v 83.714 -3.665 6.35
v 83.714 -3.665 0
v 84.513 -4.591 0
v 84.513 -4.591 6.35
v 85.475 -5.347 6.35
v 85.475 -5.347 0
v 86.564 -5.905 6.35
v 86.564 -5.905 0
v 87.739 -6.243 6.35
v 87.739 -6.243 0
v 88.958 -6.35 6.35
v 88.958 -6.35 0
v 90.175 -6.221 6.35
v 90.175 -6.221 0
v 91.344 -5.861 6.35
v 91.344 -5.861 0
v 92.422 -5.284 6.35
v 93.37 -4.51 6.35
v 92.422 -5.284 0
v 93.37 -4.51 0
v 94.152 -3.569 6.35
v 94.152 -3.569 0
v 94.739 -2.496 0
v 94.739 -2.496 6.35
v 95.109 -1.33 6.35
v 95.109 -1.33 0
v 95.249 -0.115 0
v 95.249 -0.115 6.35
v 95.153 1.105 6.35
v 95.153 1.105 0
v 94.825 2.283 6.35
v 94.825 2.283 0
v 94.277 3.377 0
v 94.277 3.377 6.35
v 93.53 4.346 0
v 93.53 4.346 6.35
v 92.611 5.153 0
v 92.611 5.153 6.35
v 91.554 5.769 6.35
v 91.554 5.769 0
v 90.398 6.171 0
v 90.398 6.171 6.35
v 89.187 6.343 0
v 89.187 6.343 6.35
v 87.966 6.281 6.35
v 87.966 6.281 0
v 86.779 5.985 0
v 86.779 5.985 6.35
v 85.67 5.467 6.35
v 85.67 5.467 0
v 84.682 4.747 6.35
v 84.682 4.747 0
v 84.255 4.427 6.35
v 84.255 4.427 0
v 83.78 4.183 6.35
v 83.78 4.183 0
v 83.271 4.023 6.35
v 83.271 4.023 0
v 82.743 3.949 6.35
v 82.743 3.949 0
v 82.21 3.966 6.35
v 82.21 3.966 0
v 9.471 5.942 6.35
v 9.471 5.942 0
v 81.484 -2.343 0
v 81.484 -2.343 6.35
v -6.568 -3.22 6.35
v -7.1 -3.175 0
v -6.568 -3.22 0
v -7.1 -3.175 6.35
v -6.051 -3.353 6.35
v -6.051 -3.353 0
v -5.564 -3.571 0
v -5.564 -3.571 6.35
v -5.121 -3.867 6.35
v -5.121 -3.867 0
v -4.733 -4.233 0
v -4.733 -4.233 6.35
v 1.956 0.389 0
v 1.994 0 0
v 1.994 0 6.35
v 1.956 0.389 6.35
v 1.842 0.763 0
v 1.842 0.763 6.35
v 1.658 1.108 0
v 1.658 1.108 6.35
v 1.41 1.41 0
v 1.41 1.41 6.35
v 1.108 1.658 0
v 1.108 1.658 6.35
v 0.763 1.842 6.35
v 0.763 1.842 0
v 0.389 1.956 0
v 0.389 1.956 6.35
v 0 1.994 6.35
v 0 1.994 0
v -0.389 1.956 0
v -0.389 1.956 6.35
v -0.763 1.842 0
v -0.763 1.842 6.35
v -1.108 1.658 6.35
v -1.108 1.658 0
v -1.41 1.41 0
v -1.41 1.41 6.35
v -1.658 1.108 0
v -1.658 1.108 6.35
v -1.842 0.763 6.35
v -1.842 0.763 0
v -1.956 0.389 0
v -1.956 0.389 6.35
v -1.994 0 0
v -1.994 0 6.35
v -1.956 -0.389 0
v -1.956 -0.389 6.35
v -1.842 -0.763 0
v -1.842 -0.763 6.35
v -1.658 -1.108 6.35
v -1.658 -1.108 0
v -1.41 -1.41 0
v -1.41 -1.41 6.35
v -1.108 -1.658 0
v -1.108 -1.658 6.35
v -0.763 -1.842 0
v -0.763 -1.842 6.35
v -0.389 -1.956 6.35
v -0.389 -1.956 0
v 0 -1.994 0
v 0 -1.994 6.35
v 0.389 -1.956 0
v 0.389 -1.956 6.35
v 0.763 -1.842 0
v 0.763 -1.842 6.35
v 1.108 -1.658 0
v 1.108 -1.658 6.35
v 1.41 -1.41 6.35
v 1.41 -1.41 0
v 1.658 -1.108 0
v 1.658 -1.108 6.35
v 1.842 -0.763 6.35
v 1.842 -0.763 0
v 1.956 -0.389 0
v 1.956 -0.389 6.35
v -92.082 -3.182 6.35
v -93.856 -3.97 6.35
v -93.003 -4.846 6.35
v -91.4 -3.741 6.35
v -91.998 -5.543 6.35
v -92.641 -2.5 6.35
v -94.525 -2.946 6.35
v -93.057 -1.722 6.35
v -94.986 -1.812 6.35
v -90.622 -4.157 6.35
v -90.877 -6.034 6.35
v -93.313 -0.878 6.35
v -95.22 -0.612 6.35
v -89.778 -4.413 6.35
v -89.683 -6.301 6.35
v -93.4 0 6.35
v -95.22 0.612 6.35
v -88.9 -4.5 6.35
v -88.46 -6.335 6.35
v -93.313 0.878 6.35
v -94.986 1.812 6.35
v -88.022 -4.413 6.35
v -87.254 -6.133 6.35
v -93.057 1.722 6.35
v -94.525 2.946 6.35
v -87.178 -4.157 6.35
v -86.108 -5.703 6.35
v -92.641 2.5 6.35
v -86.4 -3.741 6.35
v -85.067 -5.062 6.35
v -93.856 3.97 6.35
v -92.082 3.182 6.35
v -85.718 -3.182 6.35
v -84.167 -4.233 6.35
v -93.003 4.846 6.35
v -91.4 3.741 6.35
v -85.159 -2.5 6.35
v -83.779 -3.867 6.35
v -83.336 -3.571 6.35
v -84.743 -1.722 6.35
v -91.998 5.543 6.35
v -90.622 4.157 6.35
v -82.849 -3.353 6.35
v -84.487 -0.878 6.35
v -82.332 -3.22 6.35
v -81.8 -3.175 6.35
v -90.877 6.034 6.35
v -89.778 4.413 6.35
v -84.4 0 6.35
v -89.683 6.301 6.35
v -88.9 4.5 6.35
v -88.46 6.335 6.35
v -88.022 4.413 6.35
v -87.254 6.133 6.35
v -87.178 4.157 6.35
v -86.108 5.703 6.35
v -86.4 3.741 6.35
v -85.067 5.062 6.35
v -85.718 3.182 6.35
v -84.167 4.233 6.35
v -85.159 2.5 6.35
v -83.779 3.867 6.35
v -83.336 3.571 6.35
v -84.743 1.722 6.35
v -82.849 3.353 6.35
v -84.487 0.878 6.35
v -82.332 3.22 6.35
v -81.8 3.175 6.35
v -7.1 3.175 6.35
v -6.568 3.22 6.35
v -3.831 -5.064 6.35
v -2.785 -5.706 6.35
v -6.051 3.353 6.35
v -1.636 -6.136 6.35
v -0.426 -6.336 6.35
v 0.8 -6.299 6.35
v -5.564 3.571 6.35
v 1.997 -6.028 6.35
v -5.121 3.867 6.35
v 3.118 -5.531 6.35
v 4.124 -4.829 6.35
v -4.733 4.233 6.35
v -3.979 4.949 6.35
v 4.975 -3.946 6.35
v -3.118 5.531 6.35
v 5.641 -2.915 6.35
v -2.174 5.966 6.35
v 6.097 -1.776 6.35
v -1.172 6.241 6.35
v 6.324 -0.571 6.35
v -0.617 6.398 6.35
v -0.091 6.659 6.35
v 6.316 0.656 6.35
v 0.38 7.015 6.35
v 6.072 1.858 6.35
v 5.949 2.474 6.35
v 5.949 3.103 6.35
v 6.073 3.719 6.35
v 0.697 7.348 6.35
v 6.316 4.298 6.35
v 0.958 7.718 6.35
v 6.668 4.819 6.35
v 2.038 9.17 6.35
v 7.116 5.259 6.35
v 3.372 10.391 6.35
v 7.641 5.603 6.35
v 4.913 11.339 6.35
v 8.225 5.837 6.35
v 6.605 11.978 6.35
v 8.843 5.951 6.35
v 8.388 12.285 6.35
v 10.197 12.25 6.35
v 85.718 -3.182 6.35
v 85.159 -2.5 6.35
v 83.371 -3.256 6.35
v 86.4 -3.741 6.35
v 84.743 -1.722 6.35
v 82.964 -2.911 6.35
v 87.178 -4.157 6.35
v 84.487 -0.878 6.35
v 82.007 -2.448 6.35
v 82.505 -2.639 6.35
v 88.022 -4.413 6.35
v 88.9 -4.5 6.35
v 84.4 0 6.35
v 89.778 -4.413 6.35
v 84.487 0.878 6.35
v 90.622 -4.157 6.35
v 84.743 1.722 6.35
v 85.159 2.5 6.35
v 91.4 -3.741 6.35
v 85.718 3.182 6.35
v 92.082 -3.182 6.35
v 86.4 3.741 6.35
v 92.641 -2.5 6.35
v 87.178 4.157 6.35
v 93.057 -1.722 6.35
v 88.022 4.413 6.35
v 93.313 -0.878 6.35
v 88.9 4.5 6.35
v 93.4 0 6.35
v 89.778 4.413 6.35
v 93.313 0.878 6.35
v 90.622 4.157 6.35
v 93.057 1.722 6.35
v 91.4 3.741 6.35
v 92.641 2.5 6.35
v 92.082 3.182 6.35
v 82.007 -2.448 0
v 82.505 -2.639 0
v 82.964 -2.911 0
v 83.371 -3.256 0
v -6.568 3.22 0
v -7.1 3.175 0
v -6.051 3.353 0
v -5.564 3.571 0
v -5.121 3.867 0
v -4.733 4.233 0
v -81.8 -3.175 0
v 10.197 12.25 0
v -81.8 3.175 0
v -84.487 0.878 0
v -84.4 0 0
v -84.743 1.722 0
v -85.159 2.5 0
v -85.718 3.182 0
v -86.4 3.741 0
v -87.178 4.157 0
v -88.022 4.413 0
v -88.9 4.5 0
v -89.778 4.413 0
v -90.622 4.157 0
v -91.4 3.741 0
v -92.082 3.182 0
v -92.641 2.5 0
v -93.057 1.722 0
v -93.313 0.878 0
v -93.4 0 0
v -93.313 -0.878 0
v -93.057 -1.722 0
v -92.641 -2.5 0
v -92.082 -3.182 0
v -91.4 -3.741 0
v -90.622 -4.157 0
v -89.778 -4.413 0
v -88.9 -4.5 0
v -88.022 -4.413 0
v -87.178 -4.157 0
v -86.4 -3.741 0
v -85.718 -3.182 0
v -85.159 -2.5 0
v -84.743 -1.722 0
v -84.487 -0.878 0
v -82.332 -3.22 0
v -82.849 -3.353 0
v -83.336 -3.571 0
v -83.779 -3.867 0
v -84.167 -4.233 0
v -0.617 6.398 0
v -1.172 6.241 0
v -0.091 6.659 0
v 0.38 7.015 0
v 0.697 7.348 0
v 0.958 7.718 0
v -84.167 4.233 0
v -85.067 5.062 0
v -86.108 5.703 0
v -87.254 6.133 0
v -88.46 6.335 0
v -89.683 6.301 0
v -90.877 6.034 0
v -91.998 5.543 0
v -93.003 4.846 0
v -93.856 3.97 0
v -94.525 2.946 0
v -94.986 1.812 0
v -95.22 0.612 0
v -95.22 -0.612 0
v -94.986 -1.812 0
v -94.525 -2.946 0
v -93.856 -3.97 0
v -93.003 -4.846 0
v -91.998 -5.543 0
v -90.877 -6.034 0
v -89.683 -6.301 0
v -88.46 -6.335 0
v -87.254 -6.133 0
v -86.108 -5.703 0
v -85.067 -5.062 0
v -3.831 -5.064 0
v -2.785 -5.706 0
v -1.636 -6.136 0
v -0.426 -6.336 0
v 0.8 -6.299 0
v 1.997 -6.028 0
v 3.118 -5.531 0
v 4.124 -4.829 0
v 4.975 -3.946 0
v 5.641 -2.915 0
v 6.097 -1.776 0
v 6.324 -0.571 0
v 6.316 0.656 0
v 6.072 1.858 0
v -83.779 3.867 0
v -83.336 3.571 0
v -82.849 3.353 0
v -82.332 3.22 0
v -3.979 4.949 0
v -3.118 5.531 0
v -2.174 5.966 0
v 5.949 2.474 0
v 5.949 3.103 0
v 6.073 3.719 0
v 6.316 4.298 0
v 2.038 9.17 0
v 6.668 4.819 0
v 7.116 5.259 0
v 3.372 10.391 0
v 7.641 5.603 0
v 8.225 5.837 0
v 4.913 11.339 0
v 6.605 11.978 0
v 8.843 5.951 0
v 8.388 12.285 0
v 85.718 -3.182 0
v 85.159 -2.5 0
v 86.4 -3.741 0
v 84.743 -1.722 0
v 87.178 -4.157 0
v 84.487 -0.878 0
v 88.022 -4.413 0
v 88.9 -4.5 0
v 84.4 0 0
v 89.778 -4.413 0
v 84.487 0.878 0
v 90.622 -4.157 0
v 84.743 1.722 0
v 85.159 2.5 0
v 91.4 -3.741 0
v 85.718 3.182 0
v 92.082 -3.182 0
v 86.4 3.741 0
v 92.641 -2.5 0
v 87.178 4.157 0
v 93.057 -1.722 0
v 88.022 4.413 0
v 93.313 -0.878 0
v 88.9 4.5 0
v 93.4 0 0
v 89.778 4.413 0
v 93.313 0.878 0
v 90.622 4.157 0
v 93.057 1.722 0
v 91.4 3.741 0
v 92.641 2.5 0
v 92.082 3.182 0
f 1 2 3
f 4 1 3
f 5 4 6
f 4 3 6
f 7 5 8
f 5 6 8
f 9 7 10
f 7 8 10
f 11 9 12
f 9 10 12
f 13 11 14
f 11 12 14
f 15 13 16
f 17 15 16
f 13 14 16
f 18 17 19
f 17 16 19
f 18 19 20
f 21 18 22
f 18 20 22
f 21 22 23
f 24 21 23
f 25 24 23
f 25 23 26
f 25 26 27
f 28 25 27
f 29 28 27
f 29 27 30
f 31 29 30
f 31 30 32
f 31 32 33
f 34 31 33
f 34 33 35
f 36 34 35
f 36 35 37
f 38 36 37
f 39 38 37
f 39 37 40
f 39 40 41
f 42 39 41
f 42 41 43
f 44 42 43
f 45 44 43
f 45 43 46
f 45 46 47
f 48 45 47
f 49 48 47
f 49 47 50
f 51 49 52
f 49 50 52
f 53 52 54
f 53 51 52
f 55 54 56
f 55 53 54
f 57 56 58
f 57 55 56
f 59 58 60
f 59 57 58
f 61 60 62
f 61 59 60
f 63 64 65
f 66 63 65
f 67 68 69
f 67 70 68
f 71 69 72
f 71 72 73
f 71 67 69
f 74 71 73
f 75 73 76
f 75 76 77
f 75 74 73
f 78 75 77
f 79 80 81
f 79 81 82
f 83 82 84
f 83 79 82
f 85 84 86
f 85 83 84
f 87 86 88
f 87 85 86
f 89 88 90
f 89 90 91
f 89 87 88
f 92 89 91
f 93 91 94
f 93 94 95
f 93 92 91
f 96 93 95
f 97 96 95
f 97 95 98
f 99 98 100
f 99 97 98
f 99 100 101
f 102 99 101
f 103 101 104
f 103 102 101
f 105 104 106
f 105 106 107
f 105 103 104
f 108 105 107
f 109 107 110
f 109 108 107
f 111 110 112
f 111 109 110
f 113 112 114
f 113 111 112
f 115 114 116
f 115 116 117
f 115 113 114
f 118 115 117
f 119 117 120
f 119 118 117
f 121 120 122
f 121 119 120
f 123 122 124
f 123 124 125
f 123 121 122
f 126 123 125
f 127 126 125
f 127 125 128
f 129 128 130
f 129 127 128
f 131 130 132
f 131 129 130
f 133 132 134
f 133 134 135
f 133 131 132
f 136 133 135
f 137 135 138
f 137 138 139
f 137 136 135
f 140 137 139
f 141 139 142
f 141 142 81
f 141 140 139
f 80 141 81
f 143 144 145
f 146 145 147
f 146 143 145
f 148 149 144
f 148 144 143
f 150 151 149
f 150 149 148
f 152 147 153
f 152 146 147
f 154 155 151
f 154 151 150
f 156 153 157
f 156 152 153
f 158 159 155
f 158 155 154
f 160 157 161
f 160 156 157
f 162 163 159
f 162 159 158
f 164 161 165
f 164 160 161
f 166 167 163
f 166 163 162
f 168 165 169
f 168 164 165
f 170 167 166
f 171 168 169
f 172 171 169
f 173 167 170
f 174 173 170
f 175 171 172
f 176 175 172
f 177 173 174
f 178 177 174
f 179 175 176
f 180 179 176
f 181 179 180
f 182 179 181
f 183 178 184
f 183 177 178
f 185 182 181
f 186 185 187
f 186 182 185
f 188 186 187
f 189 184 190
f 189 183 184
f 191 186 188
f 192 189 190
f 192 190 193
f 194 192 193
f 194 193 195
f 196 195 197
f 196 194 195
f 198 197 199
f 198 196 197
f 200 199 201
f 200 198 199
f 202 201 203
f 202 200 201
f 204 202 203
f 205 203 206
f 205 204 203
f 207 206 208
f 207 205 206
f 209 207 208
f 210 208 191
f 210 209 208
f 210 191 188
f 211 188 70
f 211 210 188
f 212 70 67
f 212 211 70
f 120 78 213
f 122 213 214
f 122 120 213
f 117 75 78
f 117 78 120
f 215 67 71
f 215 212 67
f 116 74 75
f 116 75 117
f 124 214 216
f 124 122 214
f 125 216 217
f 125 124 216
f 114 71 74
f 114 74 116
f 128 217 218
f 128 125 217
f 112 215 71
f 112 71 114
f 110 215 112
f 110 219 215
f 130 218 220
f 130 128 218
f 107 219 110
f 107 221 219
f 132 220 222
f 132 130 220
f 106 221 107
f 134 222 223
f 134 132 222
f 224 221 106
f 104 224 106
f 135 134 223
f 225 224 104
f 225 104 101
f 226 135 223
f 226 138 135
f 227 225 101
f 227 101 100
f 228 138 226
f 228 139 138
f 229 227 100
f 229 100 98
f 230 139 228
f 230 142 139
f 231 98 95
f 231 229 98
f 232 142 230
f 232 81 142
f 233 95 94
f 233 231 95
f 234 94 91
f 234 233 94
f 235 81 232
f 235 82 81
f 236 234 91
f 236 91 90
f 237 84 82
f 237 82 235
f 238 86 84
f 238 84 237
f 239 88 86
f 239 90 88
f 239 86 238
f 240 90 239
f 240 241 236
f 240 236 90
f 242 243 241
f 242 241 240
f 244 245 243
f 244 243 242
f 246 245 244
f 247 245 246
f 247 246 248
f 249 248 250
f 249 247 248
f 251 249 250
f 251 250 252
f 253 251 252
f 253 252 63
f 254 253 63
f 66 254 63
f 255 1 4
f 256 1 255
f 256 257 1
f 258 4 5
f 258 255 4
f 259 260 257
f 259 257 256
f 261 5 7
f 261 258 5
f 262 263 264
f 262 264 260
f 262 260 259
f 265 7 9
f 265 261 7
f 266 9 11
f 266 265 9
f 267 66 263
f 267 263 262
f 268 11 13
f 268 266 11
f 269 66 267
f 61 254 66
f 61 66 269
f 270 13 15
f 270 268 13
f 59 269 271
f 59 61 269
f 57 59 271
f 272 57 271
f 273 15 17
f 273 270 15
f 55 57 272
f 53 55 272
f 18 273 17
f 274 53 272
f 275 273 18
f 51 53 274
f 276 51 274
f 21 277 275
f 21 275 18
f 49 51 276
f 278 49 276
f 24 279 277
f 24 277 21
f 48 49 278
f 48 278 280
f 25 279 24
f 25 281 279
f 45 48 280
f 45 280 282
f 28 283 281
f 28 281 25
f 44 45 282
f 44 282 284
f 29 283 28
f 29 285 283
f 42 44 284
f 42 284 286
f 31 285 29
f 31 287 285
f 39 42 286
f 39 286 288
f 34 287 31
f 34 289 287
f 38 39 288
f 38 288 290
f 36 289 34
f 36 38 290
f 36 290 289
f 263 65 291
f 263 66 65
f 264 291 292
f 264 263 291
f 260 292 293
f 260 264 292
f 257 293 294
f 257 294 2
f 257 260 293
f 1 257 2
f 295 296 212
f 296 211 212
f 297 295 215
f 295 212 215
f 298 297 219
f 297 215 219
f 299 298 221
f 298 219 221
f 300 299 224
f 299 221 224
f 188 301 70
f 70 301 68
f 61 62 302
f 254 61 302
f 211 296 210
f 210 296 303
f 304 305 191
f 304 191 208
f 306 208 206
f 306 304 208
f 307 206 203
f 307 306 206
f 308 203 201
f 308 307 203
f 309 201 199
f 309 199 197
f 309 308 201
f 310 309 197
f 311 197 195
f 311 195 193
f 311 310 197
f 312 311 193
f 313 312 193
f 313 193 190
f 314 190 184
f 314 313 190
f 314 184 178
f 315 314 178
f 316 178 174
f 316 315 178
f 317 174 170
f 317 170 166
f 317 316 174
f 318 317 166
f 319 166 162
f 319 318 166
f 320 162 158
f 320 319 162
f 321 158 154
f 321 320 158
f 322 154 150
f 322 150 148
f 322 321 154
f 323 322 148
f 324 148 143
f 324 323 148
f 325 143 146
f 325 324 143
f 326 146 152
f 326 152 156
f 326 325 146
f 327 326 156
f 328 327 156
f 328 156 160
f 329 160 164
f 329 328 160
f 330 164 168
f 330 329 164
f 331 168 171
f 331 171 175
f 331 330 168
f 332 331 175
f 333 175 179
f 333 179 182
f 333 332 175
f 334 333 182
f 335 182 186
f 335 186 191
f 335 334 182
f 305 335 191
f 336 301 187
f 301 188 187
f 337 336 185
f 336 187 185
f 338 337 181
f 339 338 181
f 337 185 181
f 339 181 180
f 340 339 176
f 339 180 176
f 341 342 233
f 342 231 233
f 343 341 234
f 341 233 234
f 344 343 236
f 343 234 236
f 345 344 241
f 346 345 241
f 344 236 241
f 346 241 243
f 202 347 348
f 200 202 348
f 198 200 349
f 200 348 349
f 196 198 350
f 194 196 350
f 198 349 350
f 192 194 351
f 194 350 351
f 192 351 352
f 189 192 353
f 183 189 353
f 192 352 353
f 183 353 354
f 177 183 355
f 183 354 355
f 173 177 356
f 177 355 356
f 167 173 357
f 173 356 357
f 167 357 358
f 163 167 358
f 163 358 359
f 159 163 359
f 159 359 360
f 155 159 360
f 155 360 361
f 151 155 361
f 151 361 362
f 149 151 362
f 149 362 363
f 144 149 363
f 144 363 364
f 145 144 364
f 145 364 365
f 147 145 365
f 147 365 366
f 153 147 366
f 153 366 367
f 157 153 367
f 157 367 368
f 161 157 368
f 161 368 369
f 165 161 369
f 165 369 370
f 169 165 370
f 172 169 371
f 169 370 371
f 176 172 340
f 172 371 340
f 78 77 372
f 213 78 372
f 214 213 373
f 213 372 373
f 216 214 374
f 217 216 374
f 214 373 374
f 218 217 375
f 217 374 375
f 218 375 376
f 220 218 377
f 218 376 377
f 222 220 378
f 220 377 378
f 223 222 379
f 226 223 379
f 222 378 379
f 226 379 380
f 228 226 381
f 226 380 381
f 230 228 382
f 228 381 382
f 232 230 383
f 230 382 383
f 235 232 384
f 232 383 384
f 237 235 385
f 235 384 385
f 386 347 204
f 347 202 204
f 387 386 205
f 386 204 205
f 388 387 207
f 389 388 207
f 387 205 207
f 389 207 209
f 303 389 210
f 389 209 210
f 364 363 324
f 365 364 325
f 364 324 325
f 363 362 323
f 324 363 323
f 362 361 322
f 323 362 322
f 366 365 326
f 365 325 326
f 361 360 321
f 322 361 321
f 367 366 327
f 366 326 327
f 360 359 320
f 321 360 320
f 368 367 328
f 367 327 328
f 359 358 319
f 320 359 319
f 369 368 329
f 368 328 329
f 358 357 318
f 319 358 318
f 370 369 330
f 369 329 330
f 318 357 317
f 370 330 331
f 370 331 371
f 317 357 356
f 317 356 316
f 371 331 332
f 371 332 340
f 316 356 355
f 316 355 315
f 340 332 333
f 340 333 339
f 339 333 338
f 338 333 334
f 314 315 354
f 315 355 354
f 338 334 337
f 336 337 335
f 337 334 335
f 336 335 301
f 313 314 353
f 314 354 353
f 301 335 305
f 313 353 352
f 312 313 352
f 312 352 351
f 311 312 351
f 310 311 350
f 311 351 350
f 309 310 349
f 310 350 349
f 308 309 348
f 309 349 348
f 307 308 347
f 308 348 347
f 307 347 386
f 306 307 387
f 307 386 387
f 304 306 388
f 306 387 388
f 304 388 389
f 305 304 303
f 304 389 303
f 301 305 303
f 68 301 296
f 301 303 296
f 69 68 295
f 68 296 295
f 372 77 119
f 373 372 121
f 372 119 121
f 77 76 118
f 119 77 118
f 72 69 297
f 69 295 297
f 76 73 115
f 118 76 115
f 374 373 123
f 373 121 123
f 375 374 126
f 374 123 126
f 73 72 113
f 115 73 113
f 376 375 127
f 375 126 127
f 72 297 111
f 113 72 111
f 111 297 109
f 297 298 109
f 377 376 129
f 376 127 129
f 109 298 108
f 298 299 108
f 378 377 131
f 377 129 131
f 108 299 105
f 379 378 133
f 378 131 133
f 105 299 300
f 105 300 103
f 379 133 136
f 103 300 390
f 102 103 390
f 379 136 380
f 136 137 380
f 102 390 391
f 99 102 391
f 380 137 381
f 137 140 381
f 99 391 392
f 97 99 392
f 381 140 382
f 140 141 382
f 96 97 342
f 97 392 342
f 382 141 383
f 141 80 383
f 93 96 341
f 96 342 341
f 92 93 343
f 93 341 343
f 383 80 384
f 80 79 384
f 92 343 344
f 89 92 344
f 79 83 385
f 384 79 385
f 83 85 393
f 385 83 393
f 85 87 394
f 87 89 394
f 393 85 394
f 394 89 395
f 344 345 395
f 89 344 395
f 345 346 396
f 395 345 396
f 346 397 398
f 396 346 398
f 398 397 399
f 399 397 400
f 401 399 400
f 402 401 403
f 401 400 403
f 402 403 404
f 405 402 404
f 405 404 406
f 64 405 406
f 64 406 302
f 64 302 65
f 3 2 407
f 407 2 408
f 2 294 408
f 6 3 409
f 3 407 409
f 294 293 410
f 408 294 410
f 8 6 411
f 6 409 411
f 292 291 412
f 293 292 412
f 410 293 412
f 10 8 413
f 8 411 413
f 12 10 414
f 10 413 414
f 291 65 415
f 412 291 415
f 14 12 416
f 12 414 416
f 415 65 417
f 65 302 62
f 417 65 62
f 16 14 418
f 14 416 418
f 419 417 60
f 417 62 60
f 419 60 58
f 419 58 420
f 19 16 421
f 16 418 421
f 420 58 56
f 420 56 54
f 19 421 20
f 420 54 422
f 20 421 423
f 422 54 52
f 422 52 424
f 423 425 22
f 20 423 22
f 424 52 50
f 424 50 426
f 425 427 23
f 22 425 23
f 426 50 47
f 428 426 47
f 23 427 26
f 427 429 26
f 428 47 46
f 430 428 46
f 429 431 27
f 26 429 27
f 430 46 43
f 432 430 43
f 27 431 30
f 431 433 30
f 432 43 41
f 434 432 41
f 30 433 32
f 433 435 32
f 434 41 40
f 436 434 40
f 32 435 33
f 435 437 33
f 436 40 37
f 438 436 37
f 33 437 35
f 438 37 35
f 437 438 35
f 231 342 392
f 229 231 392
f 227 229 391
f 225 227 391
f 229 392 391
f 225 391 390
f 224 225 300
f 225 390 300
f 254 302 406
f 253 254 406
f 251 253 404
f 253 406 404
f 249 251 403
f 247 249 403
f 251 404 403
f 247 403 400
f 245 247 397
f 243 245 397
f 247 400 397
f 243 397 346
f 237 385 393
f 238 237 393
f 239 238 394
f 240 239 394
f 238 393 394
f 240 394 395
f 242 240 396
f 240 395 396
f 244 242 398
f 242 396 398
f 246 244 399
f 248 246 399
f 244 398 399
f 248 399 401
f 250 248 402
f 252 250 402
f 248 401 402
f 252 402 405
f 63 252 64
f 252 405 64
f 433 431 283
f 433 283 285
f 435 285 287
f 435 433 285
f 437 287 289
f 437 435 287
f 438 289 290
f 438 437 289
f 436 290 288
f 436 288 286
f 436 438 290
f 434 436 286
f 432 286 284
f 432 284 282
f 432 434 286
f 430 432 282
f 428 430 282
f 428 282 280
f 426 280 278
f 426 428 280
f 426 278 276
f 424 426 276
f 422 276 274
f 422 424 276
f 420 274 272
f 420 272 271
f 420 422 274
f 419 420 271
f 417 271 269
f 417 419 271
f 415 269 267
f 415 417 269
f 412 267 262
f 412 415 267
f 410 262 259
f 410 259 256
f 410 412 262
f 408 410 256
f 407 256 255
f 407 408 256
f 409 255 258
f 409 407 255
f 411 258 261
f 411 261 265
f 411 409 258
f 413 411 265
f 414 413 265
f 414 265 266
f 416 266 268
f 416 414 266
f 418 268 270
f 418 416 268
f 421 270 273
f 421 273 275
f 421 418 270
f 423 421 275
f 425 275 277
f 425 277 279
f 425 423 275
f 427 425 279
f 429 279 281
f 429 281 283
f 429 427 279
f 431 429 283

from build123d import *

# Parameters (mm, degrees)
SKETCH1_R           = 4.49961
SKETCH1_R_2         = 1.9939
BOSS_EXTRUDE1_DEPTH = 6.35
FILLET2_R           = 3.175


with BuildPart() as part:
    # Sketch1 → Boss-Extrude1 (new body)
    with BuildSketch(Plane.XY):
        with BuildLine():
            Line((-83.400738686, -3.175), (-5.499261314, -3.175))
            ThreePointArc((-5.499261314, -3.175), (2.532857004, -5.822983376), (6.072024587, 1.858229644))
            ThreePointArc((6.072024587, 1.858229644), (6.667791277, 4.818557399), (9.470894014, 5.941541551))
            Line((9.470894014, 5.941541551), (83.073913127, -2.525710148))
            ThreePointArc((83.073913127, -2.525710148), (95.20839431, -0.725714286), (83.799627413, 3.782684163))
            Line((83.799627413, 3.782684163), (10.196608307, 12.249935861))
            ThreePointArc((10.196608307, 12.249935861), (4.237192952, 10.972727963), (0.272052538, 6.344169561))
            ThreePointArc((0.272052538, 6.344169561), (-3.056441857, 5.566027594), (-5.499261314, 3.175))
            Line((-5.499261314, 3.175), (-83.400738686, 3.175))
            ThreePointArc((-83.400738686, 3.175), (-95.25, 0), (-83.400738686, -3.175))
        make_face()
        with Locations((-88.9, 0)):
            Circle(SKETCH1_R, mode=Mode.SUBTRACT)
        Circle(SKETCH1_R_2, mode=Mode.SUBTRACT)
        with Locations((88.9, 0)):
            Circle(SKETCH1_R, mode=Mode.SUBTRACT)
    extrude(amount=BOSS_EXTRUDE1_DEPTH)

    # Fillet2
    fillet2_edges = [part.edges().sort_by_distance(p)[0] for p in [
        (-5.499261314, -3.175, 3.175),
        (-83.400738686, -3.175, 3.175),
        (-83.400738686, 3.175, 3.175),
        (-5.499261314, 3.175, 3.175),
        (0.272052538, 6.344169561, 3.175),
        (83.799627413, 3.782684163, 3.175),
        (83.073913127, -2.525710148, 3.175),
    ]]
    fillet(fillet2_edges, radius=FILLET2_R)


solid = part.part
